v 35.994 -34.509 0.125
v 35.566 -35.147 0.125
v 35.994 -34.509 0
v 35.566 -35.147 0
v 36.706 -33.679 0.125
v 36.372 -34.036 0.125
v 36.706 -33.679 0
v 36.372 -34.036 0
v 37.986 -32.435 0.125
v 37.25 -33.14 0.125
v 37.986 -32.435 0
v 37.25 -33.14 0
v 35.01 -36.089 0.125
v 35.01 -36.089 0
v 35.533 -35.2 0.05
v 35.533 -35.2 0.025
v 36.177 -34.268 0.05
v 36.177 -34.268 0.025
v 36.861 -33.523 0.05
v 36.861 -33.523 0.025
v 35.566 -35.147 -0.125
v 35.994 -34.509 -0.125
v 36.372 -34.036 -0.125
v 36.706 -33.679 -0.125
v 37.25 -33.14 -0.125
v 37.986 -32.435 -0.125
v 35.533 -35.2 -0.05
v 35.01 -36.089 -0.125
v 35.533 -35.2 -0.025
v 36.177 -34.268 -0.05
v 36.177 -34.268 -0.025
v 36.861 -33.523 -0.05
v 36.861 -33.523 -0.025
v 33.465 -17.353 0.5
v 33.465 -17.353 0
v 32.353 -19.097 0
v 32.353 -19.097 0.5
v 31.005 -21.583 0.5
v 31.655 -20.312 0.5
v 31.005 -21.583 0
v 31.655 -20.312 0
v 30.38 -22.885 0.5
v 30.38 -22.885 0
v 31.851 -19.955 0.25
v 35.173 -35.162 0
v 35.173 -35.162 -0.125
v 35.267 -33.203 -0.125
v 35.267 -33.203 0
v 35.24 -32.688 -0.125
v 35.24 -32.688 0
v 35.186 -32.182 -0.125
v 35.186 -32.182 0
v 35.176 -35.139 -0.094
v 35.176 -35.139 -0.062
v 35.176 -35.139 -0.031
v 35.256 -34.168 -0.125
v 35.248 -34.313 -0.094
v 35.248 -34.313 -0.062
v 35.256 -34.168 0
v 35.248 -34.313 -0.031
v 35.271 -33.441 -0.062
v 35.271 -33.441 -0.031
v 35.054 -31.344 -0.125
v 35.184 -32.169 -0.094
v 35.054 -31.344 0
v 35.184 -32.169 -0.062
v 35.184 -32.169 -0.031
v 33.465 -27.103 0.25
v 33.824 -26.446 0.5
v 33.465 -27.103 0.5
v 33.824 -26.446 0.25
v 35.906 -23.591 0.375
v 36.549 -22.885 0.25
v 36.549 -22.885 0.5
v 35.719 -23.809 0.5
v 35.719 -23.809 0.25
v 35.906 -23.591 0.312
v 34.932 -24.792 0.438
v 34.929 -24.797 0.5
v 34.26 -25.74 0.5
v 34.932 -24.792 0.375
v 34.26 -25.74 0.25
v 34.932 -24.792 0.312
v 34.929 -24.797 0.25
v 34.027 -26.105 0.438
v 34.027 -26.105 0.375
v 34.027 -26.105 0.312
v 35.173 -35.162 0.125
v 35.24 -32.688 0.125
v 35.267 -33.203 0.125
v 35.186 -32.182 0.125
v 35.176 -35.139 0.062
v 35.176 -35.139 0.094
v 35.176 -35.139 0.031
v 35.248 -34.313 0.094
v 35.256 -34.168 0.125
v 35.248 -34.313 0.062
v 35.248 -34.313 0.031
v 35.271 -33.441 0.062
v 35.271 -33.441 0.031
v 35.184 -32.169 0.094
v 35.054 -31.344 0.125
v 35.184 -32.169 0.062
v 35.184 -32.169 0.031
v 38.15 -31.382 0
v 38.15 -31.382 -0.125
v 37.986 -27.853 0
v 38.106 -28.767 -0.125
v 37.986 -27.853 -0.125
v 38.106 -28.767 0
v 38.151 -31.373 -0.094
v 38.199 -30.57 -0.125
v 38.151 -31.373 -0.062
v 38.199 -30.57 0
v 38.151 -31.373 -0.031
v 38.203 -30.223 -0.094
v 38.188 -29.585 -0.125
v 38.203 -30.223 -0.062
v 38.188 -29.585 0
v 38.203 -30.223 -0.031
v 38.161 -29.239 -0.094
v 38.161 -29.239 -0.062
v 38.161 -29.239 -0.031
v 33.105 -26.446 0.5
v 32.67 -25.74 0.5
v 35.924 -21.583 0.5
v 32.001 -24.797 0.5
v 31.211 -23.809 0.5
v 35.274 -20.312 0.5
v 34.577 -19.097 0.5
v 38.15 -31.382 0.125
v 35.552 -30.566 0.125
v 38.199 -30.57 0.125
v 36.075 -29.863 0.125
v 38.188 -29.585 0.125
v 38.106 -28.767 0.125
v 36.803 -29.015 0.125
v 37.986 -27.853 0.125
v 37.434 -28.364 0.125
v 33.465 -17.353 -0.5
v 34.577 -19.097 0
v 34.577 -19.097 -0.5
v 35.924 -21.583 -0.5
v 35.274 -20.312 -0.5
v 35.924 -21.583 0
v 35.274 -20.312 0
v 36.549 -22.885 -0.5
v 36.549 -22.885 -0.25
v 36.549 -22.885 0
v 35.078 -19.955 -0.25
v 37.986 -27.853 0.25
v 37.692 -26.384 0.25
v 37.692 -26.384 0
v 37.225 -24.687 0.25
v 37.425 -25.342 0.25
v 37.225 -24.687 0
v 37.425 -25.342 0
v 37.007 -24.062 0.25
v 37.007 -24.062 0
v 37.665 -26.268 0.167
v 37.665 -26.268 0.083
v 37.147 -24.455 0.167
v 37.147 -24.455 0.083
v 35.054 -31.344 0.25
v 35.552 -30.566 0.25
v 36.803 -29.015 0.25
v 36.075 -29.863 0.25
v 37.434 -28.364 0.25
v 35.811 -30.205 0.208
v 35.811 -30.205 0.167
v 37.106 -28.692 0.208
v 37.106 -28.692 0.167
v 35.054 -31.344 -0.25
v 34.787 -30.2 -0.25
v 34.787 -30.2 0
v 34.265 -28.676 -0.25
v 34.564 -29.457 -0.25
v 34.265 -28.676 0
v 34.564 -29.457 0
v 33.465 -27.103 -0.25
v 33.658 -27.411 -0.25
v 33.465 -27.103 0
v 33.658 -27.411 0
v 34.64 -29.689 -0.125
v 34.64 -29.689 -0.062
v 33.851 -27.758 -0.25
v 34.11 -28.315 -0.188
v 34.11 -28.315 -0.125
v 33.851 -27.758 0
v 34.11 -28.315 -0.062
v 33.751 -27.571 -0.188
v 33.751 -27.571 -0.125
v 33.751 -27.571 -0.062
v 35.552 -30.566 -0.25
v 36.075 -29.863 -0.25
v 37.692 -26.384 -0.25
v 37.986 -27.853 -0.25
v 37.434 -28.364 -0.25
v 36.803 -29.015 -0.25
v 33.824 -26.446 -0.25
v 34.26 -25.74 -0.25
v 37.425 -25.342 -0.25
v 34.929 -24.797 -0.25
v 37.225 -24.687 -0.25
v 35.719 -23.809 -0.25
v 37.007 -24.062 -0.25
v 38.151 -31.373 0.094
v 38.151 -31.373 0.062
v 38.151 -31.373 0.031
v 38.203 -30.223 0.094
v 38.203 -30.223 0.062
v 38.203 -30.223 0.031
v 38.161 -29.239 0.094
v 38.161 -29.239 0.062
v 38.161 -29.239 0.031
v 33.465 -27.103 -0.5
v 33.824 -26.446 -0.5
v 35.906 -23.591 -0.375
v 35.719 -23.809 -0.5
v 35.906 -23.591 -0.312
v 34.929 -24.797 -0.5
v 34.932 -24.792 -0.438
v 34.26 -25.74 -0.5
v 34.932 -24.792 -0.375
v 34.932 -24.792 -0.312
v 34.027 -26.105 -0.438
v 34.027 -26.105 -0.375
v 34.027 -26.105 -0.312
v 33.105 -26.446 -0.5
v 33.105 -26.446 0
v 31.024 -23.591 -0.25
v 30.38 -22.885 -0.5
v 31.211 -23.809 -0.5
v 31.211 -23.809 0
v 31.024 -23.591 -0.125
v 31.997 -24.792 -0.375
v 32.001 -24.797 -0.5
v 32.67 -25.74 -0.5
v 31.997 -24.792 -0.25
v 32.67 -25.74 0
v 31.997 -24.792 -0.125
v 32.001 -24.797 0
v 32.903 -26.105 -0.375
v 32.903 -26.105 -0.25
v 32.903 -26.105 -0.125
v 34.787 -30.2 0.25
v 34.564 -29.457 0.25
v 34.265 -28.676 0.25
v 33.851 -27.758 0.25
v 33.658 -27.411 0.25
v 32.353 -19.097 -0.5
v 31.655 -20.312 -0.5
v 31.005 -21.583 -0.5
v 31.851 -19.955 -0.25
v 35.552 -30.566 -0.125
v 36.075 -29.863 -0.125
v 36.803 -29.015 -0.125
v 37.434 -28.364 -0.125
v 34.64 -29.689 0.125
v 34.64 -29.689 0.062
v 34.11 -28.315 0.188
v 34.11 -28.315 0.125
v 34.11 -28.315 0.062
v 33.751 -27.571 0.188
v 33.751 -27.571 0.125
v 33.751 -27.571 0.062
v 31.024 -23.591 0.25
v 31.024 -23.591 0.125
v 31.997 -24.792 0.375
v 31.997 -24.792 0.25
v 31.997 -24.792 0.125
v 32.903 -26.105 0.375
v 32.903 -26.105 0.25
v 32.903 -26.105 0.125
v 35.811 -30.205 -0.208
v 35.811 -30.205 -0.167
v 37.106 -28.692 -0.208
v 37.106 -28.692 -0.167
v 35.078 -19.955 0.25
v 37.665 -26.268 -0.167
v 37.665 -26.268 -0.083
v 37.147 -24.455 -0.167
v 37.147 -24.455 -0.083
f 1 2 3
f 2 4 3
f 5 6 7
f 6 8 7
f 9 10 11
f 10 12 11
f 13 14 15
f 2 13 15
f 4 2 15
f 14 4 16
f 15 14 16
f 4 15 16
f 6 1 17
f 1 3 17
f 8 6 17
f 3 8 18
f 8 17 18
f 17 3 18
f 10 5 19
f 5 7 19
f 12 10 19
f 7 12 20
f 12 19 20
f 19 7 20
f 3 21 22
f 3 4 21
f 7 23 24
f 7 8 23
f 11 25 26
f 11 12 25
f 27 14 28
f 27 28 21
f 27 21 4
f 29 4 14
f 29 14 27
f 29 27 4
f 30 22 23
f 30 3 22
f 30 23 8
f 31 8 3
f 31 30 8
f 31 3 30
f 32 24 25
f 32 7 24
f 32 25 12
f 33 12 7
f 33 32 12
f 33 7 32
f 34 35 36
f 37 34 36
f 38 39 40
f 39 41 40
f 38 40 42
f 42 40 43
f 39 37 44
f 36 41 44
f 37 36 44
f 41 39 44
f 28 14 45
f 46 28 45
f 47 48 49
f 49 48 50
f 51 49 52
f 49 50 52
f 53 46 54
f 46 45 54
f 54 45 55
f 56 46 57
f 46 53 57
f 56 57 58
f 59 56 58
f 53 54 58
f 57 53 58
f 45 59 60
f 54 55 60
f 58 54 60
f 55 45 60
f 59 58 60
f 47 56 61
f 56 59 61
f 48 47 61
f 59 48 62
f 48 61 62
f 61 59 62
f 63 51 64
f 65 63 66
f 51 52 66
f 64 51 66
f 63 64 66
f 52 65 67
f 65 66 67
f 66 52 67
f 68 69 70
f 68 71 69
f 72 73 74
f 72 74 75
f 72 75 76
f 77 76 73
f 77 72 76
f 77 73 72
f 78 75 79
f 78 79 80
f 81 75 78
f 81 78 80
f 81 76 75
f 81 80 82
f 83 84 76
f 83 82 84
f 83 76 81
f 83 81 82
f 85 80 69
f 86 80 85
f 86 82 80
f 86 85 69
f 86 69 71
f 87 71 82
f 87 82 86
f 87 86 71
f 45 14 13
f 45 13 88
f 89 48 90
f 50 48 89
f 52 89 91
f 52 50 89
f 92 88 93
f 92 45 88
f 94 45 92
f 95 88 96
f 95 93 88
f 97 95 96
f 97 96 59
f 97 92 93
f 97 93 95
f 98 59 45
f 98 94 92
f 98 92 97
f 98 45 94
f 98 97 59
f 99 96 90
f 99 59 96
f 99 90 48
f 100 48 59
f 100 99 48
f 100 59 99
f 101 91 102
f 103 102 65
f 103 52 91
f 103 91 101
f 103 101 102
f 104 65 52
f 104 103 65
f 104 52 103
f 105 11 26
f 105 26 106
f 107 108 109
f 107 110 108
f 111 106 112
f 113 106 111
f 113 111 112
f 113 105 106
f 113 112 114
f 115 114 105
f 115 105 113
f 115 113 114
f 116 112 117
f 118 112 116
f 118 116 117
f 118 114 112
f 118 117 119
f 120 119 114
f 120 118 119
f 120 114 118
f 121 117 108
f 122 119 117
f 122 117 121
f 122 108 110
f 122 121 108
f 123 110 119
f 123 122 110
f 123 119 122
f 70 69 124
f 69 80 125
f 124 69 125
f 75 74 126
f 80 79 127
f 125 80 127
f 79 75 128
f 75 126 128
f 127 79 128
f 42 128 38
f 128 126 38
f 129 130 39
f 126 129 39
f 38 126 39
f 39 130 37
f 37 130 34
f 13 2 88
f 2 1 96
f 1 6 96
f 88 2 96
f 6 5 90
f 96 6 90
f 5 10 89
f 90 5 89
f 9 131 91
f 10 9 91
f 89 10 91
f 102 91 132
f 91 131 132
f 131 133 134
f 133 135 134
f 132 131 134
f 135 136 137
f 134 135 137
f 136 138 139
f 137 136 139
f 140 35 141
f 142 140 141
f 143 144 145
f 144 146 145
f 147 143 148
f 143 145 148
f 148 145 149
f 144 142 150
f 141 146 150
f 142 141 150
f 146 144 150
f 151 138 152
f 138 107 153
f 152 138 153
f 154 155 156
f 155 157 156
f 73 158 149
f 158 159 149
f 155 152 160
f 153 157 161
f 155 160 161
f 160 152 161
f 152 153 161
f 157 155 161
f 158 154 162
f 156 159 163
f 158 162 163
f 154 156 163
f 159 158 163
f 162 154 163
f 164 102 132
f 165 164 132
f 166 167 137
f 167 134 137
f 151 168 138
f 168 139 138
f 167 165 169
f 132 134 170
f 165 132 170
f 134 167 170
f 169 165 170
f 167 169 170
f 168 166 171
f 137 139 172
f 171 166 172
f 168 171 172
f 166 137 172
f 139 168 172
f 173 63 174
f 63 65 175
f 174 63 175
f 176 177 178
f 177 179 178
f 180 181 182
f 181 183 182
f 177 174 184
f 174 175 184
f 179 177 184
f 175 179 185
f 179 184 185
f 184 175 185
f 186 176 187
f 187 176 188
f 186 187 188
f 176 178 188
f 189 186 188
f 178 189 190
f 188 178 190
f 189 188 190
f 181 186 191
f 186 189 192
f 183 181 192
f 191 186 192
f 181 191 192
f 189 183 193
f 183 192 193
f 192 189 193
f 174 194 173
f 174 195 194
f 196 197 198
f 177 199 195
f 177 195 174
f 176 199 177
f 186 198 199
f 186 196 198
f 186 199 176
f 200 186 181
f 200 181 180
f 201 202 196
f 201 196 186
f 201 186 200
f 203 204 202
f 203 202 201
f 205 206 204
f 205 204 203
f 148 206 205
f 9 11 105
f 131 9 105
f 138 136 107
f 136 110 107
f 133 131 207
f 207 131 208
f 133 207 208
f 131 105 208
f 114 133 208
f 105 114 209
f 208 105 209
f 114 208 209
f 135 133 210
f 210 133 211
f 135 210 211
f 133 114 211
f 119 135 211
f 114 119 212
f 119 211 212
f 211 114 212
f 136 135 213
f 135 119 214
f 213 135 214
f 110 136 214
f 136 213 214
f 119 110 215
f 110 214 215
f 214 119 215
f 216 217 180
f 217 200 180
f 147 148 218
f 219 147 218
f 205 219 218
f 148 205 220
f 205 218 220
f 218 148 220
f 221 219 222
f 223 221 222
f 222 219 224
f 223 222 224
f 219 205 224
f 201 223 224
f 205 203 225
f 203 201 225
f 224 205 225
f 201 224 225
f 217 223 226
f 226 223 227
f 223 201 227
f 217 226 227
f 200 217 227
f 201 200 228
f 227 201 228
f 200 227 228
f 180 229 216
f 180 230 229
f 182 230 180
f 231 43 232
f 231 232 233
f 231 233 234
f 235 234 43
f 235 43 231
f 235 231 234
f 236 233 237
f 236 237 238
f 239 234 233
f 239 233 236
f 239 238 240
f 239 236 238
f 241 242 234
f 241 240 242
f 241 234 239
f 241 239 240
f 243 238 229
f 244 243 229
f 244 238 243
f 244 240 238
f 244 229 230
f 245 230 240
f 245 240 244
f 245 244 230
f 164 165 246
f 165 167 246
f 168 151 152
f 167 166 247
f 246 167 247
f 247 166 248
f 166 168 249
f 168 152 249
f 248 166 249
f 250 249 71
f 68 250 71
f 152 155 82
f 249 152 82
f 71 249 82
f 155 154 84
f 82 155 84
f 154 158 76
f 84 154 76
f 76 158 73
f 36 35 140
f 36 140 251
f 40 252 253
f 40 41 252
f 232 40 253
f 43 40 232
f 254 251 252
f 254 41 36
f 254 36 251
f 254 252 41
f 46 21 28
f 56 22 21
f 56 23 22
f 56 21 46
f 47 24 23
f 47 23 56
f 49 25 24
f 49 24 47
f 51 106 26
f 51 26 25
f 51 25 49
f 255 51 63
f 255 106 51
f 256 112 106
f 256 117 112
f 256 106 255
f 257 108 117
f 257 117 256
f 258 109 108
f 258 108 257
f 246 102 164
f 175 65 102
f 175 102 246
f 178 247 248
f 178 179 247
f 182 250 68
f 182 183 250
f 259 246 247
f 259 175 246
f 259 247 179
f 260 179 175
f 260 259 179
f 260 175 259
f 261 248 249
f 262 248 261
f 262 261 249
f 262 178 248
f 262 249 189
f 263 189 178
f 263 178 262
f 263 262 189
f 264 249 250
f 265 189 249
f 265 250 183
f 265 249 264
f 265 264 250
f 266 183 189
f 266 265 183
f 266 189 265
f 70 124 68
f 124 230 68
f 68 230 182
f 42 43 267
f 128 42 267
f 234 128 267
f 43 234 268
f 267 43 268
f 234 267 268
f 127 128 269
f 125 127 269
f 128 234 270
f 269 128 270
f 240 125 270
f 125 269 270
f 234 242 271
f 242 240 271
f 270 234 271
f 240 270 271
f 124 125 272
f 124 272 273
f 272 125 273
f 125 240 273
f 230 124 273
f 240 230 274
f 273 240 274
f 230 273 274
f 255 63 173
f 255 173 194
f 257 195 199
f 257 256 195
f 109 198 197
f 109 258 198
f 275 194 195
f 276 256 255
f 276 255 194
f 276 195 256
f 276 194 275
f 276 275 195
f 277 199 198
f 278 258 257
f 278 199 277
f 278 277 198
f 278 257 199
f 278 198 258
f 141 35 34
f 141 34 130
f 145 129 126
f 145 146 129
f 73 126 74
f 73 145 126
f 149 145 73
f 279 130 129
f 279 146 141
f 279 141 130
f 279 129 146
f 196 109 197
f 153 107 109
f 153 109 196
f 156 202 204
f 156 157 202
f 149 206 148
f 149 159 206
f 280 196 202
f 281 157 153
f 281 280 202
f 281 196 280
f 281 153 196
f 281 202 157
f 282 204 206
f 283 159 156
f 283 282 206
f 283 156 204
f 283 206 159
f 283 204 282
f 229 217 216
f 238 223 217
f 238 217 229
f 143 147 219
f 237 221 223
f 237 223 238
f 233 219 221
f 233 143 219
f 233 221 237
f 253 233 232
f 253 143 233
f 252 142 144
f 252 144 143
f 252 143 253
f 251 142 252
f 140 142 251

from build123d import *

# Parameters (mm, degrees)
F3_DEPTH = 0.5
F4_DEPTH = 0.25
F5_DEPTH = 0.125


with BuildPart() as f3:
    # F0 (on Top) → F3 (new body, symmetric)
    with BuildSketch(Plane.XY):
        with BuildLine():
            add(Edge.make_bspline(
                [(33.4646962583, -17.3531565815), (34.0183108685, -18.2014548185), (35.1449052053, -19.9277242701), (36.0757257814, -21.8882678628), (36.5491360426, -22.885389626)],
                knots=[0, 0, 0, 0, 0.4914054617, 1, 1, 1, 1], degree=3))
            Line((33.4646962583, -17.3531565815), (33.4646962583, -27.1025765687))
            add(Edge.make_bspline(
                [(36.5491360426, -22.885389626), (36.3445585773, -23.1038442345), (35.8796853463, -23.6002513022), (34.9096324661, -24.7869173938), (34.0141321874, -26.0750864021), (33.6374846111, -26.7794482037), (33.4646962583, -27.1025765687)],
                knots=[0, 0, 0, 0, 0.2146146816, 0.4876813793, 0.7649720955, 1, 1, 1, 1], degree=3))
        make_face()
        with BuildLine():
            Line((33.4646962583, -27.1025765687), (33.4646962583, -17.3531565815))
            add(Edge.make_bspline(
                [(33.4646962583, -17.3531565815), (32.9110816481, -18.2014548185), (31.7844873114, -19.9277242701), (30.8536667352, -21.8882678628), (30.380256474, -22.885389626)],
                knots=[0, 0, 0, 0, 0.4914054617, 1, 1, 1, 1], degree=3))
            add(Edge.make_bspline(
                [(30.380256474, -22.885389626), (30.5848339393, -23.1038442345), (31.0497071704, -23.6002513022), (32.0197600505, -24.7869173938), (32.9152603292, -26.0750864021), (33.2919079055, -26.7794482037), (33.4646962583, -27.1025765687)],
                knots=[0, 0, 0, 0, 0.2146146816, 0.4876813793, 0.7649720955, 1, 1, 1, 1], degree=3))
        make_face()
    extrude(amount=F3_DEPTH, both=True)

    # F1 (on Top) → F4 (join, symmetric)
    with BuildSketch(Plane.XY):
        with BuildLine():
            add(Edge.make_bspline(
                [(35.0542590022, -31.3443131745), (34.9321986711, -30.7857678371), (34.6969077554, -29.7078948129), (34.132815237, -28.3447046876), (33.7753301671, -27.5824159663), (33.5594348558, -27.2516943021), (33.4646962583, -27.1025765687)],
                knots=[0, 0, 0, 0, 0.3133220633, 0.6043357393, 0.8223308356, 1, 1, 1, 1], degree=3))
            add(Edge.make_bspline(
                [(35.0542590022, -31.3443131745), (35.2772294367, -30.9821031837), (35.7692332915, -30.1828550139), (37.0790252489, -28.6734392692), (37.7096471433, -28.1030367575), (37.986304611, -27.8527978808)],
                knots=[0, 0, 0, 0, 0.3174952829, 0.7005812383, 1, 1, 1, 1], degree=3))
            add(Edge.make_bspline(
                [(37.986304611, -27.8527978808), (37.8913761068, -27.3386059194), (37.6895959259, -26.2568236513), (37.1813869776, -24.4473320709), (36.7453139366, -23.3831491328), (36.5491360426, -22.885389626)],
                knots=[0, 0, 0, 0, 0.3227170226, 0.6711723471, 1, 1, 1, 1], degree=3))
            add(Edge.make_bspline(
                [(36.5491360426, -22.885389626), (36.3445585773, -23.1038442345), (35.8796853463, -23.6002513022), (34.9096324661, -24.7869173938), (34.0141321874, -26.0750864021), (33.6374846111, -26.7794482037), (33.4646962583, -27.1025765687)],
                knots=[0, 0, 0, 0, 0.2146146816, 0.4876813793, 0.7649720955, 1, 1, 1, 1], degree=3))
        make_face()
    extrude(amount=F4_DEPTH, both=True)

    # F2 (on Top) → F5 (join, symmetric)
    with BuildSketch(Plane.XY):
        with BuildLine():
            add(Edge.make_bspline(
                [(35.0099876523, -36.0890328884), (35.0691884535, -35.8017616591), (35.2086991521, -35.1286773781), (35.3078029344, -33.4406536261), (35.206077093, -32.2005833036), (35.0939553855, -31.6004826678), (35.0542590022, -31.3443131745)],
                knots=[0, 0, 0, 0, 0.2268047855, 0.5281413876, 0.7889814592, 1, 1, 1, 1], degree=3))
            add(Edge.make_bspline(
                [(35.0099876523, -36.0890328884), (35.1785122203, -35.7952578593), (35.5196858817, -35.1968595796), (36.1572480721, -34.2428839294), (36.8370476627, -33.5371282988), (37.5739759872, -32.8287365687), (37.8503923319, -32.5516161451), (37.986304611, -32.4345082045)],
                knots=[0, 0, 0, 0, 0.2099201912, 0.43002195, 0.637960627, 0.8451293142, 1, 1, 1, 1], degree=3))
            add(Edge.make_bspline(
                [(37.986304611, -32.4345082045), (38.0349117761, -32.091378108), (38.1858021608, -31.3817408763), (38.2103824602, -30.2099574058), (38.1870733454, -29.2358358547), (38.0405633584, -28.3246195438), (37.986304611, -27.8527978808)],
                knots=[0, 0, 0, 0, 0.2419441986, 0.4924070964, 0.724101854, 1, 1, 1, 1], degree=3))
            add(Edge.make_bspline(
                [(35.0542590022, -31.3443131745), (35.2772294367, -30.9821031837), (35.7692332915, -30.1828550139), (37.0790252489, -28.6734392692), (37.7096471433, -28.1030367575), (37.986304611, -27.8527978808)],
                knots=[0, 0, 0, 0, 0.3174952829, 0.7005812383, 1, 1, 1, 1], degree=3))
        make_face()
    extrude(amount=F5_DEPTH, both=True)


solid = f3.part
